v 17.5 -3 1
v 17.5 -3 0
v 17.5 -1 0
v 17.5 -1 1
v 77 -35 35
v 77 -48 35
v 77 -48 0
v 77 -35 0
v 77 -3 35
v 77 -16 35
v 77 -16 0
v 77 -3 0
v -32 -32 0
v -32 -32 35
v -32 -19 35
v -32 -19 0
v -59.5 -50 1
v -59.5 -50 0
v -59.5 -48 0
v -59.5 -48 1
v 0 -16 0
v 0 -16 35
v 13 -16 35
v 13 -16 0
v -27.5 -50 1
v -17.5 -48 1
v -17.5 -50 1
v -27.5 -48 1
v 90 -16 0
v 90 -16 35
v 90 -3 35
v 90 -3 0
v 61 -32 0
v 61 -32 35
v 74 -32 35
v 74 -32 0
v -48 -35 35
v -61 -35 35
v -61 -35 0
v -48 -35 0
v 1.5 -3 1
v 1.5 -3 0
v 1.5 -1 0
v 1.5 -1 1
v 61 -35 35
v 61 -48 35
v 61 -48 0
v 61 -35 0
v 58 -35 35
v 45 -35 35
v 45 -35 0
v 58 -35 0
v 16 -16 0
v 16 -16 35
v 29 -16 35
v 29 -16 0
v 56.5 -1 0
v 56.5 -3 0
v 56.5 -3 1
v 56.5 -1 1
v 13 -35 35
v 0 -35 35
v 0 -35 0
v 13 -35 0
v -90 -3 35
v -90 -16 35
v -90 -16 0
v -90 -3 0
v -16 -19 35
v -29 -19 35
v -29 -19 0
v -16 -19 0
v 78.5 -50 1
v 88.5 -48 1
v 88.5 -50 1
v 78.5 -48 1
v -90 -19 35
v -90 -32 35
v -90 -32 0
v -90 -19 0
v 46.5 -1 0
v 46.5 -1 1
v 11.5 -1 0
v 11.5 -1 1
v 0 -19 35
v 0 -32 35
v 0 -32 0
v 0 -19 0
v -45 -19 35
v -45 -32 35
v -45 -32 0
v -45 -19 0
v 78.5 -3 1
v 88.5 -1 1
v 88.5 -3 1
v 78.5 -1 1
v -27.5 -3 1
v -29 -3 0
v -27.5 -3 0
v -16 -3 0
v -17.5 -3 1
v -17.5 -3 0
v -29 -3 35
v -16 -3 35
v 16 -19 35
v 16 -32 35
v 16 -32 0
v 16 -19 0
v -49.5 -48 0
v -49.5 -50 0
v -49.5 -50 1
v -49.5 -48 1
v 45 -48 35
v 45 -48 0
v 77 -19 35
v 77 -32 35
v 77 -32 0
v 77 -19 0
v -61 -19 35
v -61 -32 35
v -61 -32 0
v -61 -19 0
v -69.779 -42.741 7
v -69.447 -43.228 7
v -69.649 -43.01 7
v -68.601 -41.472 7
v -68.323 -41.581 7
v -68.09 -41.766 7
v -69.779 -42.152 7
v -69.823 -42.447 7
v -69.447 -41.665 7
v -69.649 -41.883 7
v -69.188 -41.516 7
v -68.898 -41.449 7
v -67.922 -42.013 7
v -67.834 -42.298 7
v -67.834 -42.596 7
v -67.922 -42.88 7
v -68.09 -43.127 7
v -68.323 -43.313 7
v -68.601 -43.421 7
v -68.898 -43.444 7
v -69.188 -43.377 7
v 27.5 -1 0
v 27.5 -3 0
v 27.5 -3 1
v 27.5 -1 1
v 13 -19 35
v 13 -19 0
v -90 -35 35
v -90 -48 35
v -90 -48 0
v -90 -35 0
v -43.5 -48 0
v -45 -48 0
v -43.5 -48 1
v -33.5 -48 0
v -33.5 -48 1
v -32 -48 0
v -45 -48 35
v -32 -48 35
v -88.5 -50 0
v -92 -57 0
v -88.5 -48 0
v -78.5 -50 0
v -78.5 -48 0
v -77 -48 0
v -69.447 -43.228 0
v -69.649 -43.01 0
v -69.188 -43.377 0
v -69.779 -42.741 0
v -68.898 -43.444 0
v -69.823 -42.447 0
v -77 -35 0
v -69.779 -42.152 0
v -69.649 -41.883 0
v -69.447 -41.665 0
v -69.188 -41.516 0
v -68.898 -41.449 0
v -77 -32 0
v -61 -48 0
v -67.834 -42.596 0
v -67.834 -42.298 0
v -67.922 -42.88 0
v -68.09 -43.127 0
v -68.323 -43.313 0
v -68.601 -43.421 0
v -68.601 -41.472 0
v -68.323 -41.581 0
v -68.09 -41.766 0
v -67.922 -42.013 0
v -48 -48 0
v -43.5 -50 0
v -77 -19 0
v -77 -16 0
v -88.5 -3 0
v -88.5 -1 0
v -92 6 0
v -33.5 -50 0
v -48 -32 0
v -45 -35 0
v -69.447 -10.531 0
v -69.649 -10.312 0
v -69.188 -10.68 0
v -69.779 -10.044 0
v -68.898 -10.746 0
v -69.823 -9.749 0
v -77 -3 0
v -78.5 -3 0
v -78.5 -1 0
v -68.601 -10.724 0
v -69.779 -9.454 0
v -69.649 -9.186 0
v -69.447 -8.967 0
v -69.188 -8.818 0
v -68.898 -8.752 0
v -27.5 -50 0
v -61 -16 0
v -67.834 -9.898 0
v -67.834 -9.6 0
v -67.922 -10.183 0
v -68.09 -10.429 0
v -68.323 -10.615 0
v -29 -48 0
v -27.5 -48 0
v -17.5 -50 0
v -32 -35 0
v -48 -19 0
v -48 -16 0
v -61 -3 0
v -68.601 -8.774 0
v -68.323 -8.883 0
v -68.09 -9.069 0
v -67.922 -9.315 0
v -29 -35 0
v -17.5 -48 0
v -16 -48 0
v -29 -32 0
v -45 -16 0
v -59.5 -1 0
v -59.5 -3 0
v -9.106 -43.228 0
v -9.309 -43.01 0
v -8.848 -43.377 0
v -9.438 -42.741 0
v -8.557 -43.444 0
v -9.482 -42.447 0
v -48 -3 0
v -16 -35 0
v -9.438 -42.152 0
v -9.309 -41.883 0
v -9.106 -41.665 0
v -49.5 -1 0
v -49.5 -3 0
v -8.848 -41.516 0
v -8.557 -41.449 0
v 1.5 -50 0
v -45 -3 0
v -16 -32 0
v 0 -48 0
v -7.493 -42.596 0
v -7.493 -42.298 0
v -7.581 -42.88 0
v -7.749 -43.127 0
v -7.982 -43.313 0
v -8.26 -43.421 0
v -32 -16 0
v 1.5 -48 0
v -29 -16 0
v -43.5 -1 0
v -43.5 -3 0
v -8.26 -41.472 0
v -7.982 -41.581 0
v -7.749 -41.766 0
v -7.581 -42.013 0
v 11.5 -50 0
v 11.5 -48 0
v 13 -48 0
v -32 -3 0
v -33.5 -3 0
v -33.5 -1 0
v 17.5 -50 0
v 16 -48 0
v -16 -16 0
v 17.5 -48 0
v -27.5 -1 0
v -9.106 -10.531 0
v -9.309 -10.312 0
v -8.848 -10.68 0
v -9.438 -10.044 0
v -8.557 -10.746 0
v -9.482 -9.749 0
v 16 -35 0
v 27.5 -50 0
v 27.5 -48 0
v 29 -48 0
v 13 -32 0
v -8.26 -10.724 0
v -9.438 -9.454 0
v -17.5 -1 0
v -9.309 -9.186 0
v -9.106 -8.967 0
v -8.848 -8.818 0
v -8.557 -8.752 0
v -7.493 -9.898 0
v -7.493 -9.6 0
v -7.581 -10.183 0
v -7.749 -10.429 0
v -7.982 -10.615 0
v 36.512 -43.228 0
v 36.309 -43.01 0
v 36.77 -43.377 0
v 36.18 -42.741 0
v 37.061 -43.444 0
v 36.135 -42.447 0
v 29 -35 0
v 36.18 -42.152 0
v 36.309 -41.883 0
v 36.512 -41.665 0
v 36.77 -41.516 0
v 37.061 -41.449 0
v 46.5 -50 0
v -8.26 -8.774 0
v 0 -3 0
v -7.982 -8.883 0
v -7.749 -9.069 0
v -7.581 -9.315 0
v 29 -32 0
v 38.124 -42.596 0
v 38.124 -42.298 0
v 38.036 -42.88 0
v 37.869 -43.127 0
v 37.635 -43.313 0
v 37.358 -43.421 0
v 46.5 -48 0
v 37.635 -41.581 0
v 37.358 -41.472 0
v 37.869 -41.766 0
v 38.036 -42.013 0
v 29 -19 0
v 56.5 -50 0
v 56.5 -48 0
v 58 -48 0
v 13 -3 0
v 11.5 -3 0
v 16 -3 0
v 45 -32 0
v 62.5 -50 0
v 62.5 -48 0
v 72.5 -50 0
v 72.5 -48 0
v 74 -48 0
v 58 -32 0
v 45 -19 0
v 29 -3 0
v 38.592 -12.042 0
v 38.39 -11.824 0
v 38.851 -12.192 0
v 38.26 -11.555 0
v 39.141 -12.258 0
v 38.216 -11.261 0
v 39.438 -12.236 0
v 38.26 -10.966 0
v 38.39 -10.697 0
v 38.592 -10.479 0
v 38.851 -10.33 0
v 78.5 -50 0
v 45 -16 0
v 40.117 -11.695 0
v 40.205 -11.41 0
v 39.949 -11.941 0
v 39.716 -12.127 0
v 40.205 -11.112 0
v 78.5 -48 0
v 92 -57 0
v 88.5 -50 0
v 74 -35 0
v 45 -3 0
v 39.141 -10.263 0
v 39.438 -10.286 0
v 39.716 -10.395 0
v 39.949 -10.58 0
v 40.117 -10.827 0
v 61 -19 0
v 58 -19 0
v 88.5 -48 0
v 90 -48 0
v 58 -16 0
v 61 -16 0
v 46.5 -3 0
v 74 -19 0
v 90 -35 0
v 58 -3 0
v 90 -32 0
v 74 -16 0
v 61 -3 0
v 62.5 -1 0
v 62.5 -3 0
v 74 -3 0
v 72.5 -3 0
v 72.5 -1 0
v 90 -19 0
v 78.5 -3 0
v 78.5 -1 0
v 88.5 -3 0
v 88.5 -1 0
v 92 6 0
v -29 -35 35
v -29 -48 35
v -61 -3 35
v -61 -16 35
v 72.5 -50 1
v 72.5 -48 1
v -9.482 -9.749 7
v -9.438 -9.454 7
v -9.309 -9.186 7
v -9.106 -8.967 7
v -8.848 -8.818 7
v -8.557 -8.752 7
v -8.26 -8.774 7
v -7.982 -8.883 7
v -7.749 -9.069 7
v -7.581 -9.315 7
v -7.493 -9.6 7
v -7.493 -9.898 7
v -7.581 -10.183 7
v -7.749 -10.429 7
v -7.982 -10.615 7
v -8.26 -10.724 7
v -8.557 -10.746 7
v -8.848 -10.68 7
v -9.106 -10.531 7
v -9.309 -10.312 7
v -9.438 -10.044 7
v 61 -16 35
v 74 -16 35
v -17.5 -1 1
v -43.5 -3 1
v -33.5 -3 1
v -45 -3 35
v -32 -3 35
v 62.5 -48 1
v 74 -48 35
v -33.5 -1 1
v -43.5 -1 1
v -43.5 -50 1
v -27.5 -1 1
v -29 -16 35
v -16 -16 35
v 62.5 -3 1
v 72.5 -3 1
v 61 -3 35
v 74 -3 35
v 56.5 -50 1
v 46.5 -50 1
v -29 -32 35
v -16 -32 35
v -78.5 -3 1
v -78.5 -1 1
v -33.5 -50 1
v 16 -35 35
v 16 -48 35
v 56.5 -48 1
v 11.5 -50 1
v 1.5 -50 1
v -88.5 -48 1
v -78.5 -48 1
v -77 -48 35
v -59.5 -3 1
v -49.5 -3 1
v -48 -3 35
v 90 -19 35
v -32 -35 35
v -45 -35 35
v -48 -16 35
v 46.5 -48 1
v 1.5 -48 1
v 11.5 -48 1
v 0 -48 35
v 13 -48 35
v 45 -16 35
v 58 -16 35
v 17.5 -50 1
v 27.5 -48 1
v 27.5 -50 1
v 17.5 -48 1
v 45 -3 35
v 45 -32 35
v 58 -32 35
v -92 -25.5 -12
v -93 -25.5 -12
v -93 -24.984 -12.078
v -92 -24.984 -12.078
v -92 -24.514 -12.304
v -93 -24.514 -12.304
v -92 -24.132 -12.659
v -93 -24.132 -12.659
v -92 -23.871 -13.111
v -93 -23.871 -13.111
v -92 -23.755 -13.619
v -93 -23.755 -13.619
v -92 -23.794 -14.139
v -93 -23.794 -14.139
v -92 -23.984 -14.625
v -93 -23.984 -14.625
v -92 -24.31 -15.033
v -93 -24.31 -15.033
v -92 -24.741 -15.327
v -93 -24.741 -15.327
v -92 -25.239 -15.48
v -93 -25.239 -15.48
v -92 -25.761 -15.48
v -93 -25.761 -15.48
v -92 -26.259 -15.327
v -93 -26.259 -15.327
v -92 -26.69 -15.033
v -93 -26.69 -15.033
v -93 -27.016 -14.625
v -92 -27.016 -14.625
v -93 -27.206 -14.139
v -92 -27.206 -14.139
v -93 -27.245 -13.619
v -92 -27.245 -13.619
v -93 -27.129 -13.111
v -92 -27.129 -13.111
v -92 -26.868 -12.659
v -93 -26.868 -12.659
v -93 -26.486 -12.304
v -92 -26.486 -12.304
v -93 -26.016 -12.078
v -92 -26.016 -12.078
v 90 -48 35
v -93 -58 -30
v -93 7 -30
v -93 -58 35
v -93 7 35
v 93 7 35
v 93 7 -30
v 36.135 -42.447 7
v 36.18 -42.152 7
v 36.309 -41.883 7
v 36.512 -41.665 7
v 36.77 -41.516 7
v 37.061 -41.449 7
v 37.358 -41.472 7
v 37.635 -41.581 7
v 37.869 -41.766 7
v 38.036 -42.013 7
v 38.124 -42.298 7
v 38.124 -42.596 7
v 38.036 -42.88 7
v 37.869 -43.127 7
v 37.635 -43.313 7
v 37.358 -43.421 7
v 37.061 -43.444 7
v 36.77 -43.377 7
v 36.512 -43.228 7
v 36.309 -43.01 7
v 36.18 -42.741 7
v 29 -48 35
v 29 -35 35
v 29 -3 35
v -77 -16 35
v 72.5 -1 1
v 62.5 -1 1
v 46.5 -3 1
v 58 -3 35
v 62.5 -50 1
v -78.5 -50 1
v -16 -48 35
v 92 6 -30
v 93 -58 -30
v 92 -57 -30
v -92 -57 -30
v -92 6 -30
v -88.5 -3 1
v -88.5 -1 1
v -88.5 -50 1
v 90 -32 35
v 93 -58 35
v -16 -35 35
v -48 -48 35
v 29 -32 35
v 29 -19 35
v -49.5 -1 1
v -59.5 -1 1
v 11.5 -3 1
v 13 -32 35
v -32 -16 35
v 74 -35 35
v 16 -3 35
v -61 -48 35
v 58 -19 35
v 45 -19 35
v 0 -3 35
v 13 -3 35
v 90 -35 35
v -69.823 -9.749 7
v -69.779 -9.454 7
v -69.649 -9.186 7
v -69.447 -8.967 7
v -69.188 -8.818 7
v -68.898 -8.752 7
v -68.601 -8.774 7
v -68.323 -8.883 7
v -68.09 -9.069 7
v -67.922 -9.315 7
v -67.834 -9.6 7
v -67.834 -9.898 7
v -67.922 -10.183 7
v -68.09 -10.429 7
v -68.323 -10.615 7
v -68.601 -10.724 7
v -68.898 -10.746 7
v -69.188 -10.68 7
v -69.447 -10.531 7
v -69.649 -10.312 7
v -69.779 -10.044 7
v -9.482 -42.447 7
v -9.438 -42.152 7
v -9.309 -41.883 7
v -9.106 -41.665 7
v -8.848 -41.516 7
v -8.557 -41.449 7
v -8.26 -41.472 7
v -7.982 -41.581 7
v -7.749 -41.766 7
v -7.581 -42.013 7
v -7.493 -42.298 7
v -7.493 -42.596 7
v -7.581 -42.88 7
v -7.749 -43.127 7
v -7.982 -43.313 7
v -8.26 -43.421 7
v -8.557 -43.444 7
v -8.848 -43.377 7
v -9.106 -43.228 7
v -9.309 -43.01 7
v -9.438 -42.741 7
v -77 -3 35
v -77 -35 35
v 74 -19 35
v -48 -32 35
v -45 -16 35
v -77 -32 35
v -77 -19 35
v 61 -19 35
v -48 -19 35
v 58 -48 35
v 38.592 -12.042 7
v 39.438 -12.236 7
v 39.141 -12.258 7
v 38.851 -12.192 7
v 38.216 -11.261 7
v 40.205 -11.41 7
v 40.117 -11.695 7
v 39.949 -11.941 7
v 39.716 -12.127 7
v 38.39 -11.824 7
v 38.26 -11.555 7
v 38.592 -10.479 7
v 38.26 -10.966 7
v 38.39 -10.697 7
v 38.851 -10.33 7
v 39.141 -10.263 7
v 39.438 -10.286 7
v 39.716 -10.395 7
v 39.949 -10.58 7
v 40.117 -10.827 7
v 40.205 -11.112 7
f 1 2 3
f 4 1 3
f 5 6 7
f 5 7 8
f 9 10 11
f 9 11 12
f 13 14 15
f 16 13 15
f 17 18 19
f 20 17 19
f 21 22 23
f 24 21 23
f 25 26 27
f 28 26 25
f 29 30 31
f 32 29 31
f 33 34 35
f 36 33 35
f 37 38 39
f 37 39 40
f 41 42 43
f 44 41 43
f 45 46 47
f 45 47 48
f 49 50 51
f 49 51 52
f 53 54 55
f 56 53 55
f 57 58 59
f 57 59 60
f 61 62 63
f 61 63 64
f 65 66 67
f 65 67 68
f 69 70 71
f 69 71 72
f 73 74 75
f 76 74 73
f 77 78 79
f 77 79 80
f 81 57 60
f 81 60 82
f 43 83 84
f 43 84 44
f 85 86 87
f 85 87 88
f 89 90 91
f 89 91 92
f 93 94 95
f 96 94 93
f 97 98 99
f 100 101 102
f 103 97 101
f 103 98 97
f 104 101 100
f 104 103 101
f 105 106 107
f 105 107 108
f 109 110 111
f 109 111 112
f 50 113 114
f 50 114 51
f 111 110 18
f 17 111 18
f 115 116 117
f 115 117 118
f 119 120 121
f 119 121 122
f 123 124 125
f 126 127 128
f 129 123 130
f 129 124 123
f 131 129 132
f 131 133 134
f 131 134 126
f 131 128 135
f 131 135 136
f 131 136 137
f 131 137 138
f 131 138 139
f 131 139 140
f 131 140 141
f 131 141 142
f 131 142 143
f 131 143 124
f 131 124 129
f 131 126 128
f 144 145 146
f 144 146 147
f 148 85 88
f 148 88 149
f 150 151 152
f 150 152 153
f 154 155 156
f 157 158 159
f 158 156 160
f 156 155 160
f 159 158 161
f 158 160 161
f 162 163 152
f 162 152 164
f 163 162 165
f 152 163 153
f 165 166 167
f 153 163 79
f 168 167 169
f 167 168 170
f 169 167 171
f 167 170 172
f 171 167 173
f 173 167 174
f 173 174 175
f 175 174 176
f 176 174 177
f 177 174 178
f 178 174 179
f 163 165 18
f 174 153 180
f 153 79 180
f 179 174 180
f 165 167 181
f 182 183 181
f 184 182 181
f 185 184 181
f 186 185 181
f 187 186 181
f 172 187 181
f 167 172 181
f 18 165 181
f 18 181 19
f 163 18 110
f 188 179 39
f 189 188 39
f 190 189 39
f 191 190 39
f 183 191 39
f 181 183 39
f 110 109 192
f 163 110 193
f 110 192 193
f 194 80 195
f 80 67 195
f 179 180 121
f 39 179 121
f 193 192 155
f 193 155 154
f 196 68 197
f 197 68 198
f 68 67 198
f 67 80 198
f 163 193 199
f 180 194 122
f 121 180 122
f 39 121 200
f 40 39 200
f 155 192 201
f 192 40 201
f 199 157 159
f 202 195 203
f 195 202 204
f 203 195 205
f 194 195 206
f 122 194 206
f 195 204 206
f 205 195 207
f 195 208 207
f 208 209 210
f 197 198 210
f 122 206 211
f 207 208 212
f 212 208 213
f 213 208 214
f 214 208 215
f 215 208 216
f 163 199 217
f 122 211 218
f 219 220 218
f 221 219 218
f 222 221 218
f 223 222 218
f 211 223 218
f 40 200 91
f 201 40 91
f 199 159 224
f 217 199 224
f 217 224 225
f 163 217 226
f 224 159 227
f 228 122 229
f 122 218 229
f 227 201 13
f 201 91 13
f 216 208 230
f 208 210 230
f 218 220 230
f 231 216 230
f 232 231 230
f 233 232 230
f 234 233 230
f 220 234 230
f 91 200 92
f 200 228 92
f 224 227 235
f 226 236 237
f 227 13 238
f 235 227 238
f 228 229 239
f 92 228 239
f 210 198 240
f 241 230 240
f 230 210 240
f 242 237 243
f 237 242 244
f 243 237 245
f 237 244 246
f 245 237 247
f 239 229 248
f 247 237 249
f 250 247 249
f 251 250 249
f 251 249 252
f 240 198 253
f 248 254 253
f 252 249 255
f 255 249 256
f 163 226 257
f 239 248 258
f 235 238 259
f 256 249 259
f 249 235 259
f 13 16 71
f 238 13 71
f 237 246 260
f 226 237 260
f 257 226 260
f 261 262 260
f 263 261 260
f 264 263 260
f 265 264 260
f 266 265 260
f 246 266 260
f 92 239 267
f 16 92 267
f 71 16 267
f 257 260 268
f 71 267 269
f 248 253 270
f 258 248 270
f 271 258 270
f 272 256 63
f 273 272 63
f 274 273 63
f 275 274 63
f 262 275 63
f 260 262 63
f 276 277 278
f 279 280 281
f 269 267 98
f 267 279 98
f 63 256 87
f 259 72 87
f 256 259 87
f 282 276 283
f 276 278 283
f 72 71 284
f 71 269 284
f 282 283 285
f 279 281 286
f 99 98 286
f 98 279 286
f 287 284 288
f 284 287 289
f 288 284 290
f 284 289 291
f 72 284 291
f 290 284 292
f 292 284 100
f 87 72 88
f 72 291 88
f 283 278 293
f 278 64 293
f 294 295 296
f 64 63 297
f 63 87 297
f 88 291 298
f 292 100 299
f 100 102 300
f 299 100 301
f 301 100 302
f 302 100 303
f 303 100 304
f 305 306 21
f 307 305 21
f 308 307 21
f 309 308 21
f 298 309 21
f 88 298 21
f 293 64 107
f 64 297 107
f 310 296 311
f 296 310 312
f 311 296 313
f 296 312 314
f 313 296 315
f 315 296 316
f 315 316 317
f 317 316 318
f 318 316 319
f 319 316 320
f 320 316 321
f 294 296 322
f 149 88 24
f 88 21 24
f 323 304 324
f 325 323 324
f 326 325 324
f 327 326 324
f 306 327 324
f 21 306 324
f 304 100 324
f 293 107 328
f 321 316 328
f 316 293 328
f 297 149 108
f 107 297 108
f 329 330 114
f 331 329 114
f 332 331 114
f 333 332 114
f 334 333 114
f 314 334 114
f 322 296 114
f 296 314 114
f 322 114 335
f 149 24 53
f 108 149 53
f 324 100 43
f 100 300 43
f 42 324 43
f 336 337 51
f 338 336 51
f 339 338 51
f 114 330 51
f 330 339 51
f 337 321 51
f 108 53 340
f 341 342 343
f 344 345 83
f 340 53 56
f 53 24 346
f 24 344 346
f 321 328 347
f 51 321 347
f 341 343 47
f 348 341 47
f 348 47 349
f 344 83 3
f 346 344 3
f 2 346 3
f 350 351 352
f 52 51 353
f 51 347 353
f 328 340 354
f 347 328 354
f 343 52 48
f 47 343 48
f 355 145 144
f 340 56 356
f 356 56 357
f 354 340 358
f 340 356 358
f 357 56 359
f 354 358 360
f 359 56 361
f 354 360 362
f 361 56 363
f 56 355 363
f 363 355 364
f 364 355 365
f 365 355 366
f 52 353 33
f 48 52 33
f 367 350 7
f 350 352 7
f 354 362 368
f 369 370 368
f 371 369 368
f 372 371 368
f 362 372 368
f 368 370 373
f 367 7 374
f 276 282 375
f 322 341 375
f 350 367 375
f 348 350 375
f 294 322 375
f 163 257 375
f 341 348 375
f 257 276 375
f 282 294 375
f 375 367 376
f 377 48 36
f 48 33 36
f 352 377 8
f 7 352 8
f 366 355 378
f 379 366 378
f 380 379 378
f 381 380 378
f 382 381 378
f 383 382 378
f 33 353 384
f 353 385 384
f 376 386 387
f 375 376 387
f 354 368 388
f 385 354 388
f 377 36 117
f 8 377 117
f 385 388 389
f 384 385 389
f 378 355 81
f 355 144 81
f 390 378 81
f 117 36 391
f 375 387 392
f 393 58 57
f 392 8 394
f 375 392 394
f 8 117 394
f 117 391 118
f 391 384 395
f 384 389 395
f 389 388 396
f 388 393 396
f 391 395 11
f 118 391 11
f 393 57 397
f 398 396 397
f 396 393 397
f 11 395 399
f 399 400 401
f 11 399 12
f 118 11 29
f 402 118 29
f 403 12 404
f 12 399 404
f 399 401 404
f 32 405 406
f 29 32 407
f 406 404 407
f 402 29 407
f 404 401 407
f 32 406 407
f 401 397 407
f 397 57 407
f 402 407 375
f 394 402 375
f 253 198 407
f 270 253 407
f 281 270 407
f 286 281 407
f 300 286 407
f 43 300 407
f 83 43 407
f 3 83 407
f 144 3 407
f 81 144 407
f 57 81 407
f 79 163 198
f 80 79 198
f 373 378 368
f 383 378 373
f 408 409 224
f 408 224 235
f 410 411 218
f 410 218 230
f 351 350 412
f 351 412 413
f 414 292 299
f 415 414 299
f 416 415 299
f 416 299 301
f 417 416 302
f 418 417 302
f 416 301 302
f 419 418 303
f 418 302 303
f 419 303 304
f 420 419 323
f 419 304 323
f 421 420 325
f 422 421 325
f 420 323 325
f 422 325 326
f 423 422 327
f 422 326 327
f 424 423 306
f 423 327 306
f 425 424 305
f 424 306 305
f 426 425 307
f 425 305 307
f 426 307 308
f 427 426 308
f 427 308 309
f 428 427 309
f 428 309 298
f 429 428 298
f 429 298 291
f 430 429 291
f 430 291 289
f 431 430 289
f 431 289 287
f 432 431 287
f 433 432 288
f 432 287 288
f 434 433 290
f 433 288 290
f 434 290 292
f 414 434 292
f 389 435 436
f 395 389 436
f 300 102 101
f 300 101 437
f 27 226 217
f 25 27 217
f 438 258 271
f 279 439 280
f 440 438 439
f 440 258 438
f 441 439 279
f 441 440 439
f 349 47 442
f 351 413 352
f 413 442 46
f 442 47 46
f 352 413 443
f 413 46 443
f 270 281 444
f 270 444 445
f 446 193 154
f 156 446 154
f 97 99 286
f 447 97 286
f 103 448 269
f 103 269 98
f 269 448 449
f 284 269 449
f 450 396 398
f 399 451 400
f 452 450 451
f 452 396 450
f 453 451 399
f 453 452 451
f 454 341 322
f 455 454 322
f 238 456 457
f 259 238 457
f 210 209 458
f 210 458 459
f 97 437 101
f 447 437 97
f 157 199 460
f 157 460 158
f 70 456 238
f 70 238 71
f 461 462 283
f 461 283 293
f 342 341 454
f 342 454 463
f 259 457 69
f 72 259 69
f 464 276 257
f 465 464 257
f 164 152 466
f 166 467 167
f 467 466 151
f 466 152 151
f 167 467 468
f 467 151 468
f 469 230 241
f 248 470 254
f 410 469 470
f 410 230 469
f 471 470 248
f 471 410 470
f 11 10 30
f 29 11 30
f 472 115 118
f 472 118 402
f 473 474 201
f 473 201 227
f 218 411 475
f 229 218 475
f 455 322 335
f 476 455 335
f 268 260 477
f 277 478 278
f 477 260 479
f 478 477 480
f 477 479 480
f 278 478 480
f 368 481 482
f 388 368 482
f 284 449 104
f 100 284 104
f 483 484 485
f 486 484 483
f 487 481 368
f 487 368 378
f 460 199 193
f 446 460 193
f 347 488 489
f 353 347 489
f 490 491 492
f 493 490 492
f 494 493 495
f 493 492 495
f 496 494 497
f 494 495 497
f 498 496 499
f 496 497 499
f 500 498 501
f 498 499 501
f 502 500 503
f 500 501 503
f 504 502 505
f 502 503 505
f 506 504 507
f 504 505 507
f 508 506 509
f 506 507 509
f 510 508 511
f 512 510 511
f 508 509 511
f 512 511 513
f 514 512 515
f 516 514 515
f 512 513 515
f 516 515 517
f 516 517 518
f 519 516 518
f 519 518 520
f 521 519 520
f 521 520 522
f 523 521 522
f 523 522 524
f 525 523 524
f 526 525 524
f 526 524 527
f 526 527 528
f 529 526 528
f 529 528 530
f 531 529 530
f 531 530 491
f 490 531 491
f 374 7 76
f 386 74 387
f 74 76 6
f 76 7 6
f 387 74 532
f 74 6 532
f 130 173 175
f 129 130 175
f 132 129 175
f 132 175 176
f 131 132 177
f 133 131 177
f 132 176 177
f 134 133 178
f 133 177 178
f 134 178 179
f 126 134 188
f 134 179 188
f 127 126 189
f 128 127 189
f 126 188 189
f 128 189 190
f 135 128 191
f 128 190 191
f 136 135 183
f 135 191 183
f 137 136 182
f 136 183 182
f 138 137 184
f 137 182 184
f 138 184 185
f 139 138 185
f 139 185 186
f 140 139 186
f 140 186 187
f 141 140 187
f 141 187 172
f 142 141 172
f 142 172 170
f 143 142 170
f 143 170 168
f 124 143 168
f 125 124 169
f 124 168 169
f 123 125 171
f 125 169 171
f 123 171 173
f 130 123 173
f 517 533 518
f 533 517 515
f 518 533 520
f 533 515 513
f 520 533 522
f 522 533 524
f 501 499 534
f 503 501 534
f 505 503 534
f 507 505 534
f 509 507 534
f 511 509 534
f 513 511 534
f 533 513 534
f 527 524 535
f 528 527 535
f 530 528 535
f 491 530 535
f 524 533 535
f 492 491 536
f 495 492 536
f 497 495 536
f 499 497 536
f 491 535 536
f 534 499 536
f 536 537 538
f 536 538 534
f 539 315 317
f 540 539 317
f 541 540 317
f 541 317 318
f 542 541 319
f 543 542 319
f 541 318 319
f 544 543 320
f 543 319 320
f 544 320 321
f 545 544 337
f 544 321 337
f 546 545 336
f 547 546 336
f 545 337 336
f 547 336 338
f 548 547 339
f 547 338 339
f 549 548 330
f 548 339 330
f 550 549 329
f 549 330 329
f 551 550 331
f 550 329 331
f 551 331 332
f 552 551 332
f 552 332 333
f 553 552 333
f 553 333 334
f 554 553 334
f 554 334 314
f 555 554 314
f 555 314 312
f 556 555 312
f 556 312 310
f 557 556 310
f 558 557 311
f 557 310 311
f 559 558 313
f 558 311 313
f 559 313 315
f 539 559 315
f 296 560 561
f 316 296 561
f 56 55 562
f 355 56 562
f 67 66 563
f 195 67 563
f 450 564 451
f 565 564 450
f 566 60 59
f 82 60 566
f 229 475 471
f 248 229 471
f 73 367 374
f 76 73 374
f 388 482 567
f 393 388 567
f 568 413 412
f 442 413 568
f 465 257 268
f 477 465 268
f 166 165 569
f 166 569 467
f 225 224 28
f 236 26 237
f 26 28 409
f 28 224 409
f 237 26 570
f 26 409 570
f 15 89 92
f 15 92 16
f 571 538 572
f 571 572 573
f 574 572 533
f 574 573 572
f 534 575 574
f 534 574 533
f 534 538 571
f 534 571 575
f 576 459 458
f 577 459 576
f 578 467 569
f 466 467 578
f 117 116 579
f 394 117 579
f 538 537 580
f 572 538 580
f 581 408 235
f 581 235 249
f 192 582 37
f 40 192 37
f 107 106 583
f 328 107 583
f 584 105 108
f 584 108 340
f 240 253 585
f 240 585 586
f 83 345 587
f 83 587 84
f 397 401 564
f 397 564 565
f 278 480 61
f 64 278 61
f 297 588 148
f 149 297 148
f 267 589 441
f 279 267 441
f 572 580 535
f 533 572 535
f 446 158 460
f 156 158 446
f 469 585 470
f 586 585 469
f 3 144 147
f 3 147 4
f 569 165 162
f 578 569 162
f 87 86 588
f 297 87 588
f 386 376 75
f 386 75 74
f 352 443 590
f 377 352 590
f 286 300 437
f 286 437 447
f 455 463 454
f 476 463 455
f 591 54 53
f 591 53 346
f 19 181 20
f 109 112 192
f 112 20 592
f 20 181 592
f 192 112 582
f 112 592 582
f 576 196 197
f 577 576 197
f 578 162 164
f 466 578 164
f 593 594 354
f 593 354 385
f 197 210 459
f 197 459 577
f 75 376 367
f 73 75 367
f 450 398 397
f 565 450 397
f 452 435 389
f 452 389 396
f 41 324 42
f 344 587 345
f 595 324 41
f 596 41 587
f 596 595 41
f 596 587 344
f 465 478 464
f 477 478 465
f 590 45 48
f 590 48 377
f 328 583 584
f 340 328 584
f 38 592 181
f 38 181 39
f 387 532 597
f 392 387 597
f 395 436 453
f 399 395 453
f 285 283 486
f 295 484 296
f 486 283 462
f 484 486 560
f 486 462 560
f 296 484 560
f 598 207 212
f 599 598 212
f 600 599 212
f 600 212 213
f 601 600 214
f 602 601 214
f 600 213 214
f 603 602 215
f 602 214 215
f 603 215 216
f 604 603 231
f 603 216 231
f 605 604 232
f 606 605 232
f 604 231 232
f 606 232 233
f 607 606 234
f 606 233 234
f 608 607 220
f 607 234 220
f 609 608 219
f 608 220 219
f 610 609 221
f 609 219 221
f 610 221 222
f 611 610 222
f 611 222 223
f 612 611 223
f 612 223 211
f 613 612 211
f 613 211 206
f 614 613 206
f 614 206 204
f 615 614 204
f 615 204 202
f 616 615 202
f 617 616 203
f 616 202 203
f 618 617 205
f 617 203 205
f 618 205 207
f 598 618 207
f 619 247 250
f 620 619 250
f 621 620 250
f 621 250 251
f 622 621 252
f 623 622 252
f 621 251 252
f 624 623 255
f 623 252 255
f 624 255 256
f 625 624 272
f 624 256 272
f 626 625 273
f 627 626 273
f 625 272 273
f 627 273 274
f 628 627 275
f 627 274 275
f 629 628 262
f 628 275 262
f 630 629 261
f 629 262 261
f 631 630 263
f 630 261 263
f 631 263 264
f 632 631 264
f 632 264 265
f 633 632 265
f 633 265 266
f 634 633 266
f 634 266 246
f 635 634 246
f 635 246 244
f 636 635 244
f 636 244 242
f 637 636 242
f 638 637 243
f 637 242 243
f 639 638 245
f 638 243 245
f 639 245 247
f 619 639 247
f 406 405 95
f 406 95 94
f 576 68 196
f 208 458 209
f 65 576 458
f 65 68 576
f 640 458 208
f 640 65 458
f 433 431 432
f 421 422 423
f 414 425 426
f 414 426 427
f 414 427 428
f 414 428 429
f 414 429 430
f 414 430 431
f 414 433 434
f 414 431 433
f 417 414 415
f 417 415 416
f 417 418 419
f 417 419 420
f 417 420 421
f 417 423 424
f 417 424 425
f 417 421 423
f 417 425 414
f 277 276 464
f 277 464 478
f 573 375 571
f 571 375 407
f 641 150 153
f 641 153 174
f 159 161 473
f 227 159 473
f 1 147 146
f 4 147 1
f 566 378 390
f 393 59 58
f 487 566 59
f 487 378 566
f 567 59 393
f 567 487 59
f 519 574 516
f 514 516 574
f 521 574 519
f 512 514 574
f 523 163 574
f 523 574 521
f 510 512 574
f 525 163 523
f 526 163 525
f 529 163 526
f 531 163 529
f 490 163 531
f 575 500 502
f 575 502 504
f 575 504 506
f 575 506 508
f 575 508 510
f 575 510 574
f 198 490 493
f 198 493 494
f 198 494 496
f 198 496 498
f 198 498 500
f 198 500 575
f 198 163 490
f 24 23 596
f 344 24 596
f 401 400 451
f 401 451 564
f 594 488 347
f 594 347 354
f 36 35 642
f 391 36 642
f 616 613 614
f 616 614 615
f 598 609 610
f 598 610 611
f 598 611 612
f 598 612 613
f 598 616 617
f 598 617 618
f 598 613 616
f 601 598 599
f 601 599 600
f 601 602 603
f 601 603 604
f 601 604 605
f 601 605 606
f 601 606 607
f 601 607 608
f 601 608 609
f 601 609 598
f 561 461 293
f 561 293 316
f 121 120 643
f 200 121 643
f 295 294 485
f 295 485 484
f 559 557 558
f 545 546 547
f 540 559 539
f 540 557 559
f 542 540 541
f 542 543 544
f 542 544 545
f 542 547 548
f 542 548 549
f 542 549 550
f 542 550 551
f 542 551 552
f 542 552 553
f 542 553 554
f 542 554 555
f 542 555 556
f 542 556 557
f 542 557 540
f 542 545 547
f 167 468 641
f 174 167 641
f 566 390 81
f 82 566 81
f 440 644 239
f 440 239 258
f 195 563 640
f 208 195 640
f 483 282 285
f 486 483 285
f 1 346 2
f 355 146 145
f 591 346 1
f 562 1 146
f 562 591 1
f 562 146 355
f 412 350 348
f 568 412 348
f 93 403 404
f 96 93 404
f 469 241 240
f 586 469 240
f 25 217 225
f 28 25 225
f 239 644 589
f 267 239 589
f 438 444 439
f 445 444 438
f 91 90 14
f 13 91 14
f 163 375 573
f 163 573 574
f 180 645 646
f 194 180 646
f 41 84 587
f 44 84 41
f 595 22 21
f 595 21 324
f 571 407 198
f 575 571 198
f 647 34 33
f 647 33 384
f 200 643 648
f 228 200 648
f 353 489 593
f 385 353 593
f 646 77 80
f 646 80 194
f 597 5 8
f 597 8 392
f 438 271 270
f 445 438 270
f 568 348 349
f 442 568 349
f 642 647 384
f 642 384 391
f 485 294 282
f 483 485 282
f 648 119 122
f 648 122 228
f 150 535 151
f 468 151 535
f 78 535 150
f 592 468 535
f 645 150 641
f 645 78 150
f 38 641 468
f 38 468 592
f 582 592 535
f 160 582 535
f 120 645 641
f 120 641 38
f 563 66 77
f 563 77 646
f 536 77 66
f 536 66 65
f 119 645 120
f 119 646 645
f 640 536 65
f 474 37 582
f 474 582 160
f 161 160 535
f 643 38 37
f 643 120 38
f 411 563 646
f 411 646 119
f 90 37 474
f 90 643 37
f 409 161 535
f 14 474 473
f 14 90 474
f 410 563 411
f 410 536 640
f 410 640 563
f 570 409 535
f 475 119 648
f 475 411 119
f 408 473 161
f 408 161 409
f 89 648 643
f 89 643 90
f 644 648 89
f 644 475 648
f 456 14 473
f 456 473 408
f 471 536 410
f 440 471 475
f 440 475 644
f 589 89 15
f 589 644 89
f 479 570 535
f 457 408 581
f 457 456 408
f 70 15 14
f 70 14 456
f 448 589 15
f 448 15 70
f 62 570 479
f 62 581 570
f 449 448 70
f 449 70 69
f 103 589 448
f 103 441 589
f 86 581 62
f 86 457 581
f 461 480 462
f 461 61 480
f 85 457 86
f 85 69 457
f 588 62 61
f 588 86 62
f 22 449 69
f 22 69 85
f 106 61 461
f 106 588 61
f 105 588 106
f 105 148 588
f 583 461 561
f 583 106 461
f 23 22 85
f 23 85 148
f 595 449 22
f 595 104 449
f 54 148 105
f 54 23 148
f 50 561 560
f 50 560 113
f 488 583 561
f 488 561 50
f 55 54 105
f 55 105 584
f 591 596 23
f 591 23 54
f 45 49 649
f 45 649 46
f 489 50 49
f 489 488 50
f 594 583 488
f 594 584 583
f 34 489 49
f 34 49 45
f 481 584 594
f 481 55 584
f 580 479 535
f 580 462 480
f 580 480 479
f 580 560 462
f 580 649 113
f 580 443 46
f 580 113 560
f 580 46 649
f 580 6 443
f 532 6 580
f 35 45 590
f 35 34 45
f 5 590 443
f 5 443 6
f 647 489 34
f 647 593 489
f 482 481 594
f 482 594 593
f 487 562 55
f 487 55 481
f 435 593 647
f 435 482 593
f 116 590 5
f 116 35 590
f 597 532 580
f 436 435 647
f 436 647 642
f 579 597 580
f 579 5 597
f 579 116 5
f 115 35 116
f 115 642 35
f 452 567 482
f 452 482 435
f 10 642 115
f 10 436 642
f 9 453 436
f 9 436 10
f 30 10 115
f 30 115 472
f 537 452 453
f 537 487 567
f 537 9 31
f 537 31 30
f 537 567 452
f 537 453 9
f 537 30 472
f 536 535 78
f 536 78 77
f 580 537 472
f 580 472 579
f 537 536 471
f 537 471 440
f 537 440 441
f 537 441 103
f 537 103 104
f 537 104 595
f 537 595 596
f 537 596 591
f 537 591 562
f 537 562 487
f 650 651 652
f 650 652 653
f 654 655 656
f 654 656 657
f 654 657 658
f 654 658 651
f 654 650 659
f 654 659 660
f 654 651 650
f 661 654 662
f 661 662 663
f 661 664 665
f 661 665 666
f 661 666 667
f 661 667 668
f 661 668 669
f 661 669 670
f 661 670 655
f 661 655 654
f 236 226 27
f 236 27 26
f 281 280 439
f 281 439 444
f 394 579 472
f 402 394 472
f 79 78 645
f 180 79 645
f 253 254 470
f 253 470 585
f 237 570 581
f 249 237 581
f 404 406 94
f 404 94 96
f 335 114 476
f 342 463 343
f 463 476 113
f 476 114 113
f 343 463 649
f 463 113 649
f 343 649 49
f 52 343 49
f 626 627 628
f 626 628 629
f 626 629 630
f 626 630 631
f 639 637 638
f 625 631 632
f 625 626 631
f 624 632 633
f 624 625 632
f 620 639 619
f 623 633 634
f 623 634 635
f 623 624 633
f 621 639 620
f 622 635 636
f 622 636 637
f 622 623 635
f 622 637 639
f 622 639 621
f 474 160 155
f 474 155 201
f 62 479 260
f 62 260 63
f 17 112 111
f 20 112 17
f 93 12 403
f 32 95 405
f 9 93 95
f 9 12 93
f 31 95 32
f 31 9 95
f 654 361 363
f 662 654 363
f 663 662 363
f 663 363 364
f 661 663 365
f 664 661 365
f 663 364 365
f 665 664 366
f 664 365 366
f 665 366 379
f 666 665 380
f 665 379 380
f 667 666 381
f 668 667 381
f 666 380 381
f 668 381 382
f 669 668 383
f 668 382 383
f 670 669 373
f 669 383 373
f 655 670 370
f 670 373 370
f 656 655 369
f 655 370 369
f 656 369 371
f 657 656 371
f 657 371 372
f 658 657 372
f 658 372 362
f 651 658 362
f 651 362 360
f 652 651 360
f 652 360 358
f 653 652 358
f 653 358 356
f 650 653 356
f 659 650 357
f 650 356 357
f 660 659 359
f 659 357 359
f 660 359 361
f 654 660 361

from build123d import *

# Parameters (mm, degrees)
ESQUISSE1_W                     = 186
ESQUISSE1_H                     = 51
BOSS_EXTRU_1_DEPTH              = 35
ESQUISSE7_W                     = 13
ESQUISSE7_H                     = 13
ENL_V_MAT_EXTRU_5_DEPTH         = 91
R_P_TITION_LIN_AIRE5_COUNT      = 3
R_P_TITION_LIN_AIRE5_PITCH      = 16
ESQUISSE8_W                     = 13
ESQUISSE8_H                     = 13
ENL_V_MAT_EXTRU_6_DEPTH         = 103
R_P_TITION_LIN_AIRE6_COUNT      = 3
R_P_TITION_LIN_AIRE6_PITCH      = 16
R_P_TITION_LIN_AIRE6_COUNT_DIR2 = 3
R_P_TITION_LIN_AIRE6_PITCH_DIR2 = 16
ESQUISSE9_W                     = 13
ESQUISSE9_H                     = 13
ENL_V_MAT_EXTRU_7_DEPTH         = 77
R_P_TITION_LIN_AIRE7_COUNT      = 3
R_P_TITION_LIN_AIRE7_PITCH      = 16
R_P_TITION_LIN_AIRE7_COUNT_DIR2 = 2
R_P_TITION_LIN_AIRE7_PITCH_DIR2 = 16
ESQUISSE10_W                    = 13
ESQUISSE10_H                    = 13
ENL_V_MAT_EXTRU_8_DEPTH         = 78
R_P_TITION_LIN_AIRE8_COUNT      = 3
R_P_TITION_LIN_AIRE8_PITCH      = 16
R_P_TITION_LIN_AIRE8_COUNT_DIR2 = 3
R_P_TITION_LIN_AIRE8_PITCH_DIR2 = 16
ESQUISSE14_W                    = 10
ESQUISSE14_H                    = 5
BOSS_EXTRU_3_DEPTH              = 7
ESQUISSE25_W                    = 186
ESQUISSE25_H                    = 35
BOSS_EXTRU_7_DEPTH              = 7
ESQUISSE18_W                    = 186
ESQUISSE18_H                    = 35
BOSS_EXTRU_5_DEPTH              = 7
ESQUISSE15_R                    = 1
ENL_V_MAT_EXTRU_10_DEPTH        = 7
ESQUISSE24_W                    = 10
ESQUISSE24_H                    = 2
ENL_V_MAT_EXTRU_12_DEPTH        = 1
ESQUISSE19_W                    = 186
ESQUISSE19_H                    = 1
ESQUISSE19_W_2                  = 1
ESQUISSE19_H_2                  = 63
BOSS_EXTRU_8_DEPTH              = 30
ESQUISSE26_R                    = 1.75
ENL_V_MAT_EXTRU_14_DEPTH        = 30


with BuildPart() as part:
    # Esquisse1 → Boss.-Extru.1 (new body)
    with BuildSketch(Plane.XY):
        with Locations((0, -25.5)):
            Rectangle(ESQUISSE1_W, ESQUISSE1_H)
    extrude(amount=BOSS_EXTRU_1_DEPTH)

    # Esquisse7 → Enlèv. mat.-Extru.5 (cut)
    with BuildSketch(Plane.XY.offset(35)):
        with Locations((-83.5, -9.5)):
            Rectangle(ESQUISSE7_W, ESQUISSE7_H)
    enl_v_mat_extru_5 = extrude(amount=-ENL_V_MAT_EXTRU_5_DEPTH, mode=Mode.SUBTRACT)

    # Répétition linéaire5: Enlèv. mat.-Extru.5 ×3
    with Locations(*[(0, -i * R_P_TITION_LIN_AIRE5_PITCH, 0) for i in range(1, R_P_TITION_LIN_AIRE5_COUNT)]):
        add(enl_v_mat_extru_5, mode=Mode.SUBTRACT)

    # Esquisse8 → Enlèv. mat.-Extru.6 (cut)
    with BuildSketch(Plane.XY.offset(35)):
        with Locations((-54.5, -9.5)):
            Rectangle(ESQUISSE8_W, ESQUISSE8_H)
    enl_v_mat_extru_6 = extrude(amount=-ENL_V_MAT_EXTRU_6_DEPTH, mode=Mode.SUBTRACT)

    # Répétition linéaire6: Enl_v. mat.-Extru.6 3 × 3
    with Locations(*[(j * R_P_TITION_LIN_AIRE6_PITCH_DIR2, -i * R_P_TITION_LIN_AIRE6_PITCH, 0) for i in range(R_P_TITION_LIN_AIRE6_COUNT) for j in range(R_P_TITION_LIN_AIRE6_COUNT_DIR2) if (i, j) != (0, 0)]):
        add(enl_v_mat_extru_6, mode=Mode.SUBTRACT)

    # Esquisse9 → Enlèv. mat.-Extru.7 (cut)
    with BuildSketch(Plane.XY.offset(35)):
        with Locations((6.5, -9.5)):
            Rectangle(ESQUISSE9_W, ESQUISSE9_H)
    enl_v_mat_extru_7 = extrude(amount=-ENL_V_MAT_EXTRU_7_DEPTH, mode=Mode.SUBTRACT)

    # Répétition linéaire7: Enl_v. mat.-Extru.7 3 × 2
    with Locations(*[(j * R_P_TITION_LIN_AIRE7_PITCH_DIR2, -i * R_P_TITION_LIN_AIRE7_PITCH, 0) for i in range(R_P_TITION_LIN_AIRE7_COUNT) for j in range(R_P_TITION_LIN_AIRE7_COUNT_DIR2) if (i, j) != (0, 0)]):
        add(enl_v_mat_extru_7, mode=Mode.SUBTRACT)

    # Esquisse10 → Enlèv. mat.-Extru.8 (cut)
    with BuildSketch(Plane.XY.offset(35)):
        with Locations((51.5, -9.5)):
            Rectangle(ESQUISSE10_W, ESQUISSE10_H)
    enl_v_mat_extru_8 = extrude(amount=-ENL_V_MAT_EXTRU_8_DEPTH, mode=Mode.SUBTRACT)

    # Répétition linéaire8: Enl_v. mat.-Extru.8 3 × 3
    with Locations(*[(i * R_P_TITION_LIN_AIRE8_PITCH, -j * R_P_TITION_LIN_AIRE8_PITCH_DIR2, 0) for i in range(R_P_TITION_LIN_AIRE8_COUNT) for j in range(R_P_TITION_LIN_AIRE8_COUNT_DIR2) if (i, j) != (0, 0)]):
        add(enl_v_mat_extru_8, mode=Mode.SUBTRACT)

    # Esquisse14 → Boss.-Extru.3 (add)
    with BuildSketch(Plane.XZ.offset(51)):
        with Locations((-7.663083533, 2.5)):
            Rectangle(ESQUISSE14_W, ESQUISSE14_H)
    extrude(amount=BOSS_EXTRU_3_DEPTH)

    # Esquisse25 → Boss.-Extru.7 (add)
    with BuildSketch(Plane(origin=(0, 0, 0), x_dir=(1, 0, 0), z_dir=(0, 1, 0))):
        with Locations((0, -17.5)):
            Rectangle(ESQUISSE25_W, ESQUISSE25_H)
    extrude(amount=BOSS_EXTRU_7_DEPTH)

    # Esquisse18 → Boss.-Extru.5 (add)
    with BuildSketch(Plane.XZ.offset(51)):
        with Locations((0, 17.5)):
            Rectangle(ESQUISSE18_W, ESQUISSE18_H)
    extrude(amount=BOSS_EXTRU_5_DEPTH)

    # Esquisse15 → Enlèv. mat.-Extru.10 (cut)
    with BuildSketch(Plane(origin=(0, 0, 0), x_dir=(-1, 0, 0), z_dir=(0, 0, -1))):
        with Locations((8.482305804, -42.446555864)):
            Circle(ESQUISSE15_R)
        with Locations((8.482305804, -9.749028666)):
            Circle(ESQUISSE15_R)
        with Locations((68.823038652, -42.446555864)):
            Circle(ESQUISSE15_R)
        with Locations((68.823038652, -9.749028666)):
            Circle(ESQUISSE15_R)
        with Locations((-37.13548256, -42.446555864)):
            Circle(ESQUISSE15_R)
        with Locations((-39.215855023, -11.260648292)):
            Circle(ESQUISSE15_R)
    extrude(amount=-ENL_V_MAT_EXTRU_10_DEPTH, mode=Mode.SUBTRACT)

    # Esquisse24 → Enlèv. mat.-Extru.12 (cut)
    with BuildSketch(Plane(origin=(0, 0, 0), x_dir=(-1, 0, 0), z_dir=(0, 0, -1))):
        with Locations((83.5, -49)):
            Rectangle(ESQUISSE24_W, ESQUISSE24_H)
        with Locations((54.5, -49)):
            Rectangle(ESQUISSE24_W, ESQUISSE24_H)
        with Locations((38.5, -49)):
            Rectangle(ESQUISSE24_W, ESQUISSE24_H)
        with Locations((22.5, -49)):
            Rectangle(ESQUISSE24_W, ESQUISSE24_H)
        with Locations((-6.5, -49)):
            Rectangle(ESQUISSE24_W, ESQUISSE24_H)
        with Locations((-22.5, -49)):
            Rectangle(ESQUISSE24_W, ESQUISSE24_H)
        with Locations((-51.5, -49)):
            Rectangle(ESQUISSE24_W, ESQUISSE24_H)
        with Locations((-67.5, -49)):
            Rectangle(ESQUISSE24_W, ESQUISSE24_H)
        with Locations((-83.5, -49)):
            Rectangle(ESQUISSE24_W, ESQUISSE24_H)
        with Locations((-83.5, -2)):
            Rectangle(ESQUISSE24_W, ESQUISSE24_H)
        with Locations((-67.5, -2)):
            Rectangle(ESQUISSE24_W, ESQUISSE24_H)
        with Locations((-51.5, -2)):
            Rectangle(ESQUISSE24_W, ESQUISSE24_H)
        with Locations((-22.5, -2)):
            Rectangle(ESQUISSE24_W, ESQUISSE24_H)
        with Locations((-6.5, -2)):
            Rectangle(ESQUISSE24_W, ESQUISSE24_H)
        with Locations((22.5, -2)):
            Rectangle(ESQUISSE24_W, ESQUISSE24_H)
        with Locations((38.5, -2)):
            Rectangle(ESQUISSE24_W, ESQUISSE24_H)
        with Locations((54.5, -2)):
            Rectangle(ESQUISSE24_W, ESQUISSE24_H)
        with Locations((83.5, -2)):
            Rectangle(ESQUISSE24_W, ESQUISSE24_H)
    extrude(amount=-ENL_V_MAT_EXTRU_12_DEPTH, mode=Mode.SUBTRACT)

    # Esquisse19 → Boss.-Extru.8 (add)
    with BuildSketch(Plane(origin=(0, 0, 0), x_dir=(-1, 0, 0), z_dir=(0, 0, -1))):
        with Locations((0, -57.5)):
            Rectangle(ESQUISSE19_W, ESQUISSE19_H)
        with Locations((92.5, -25.5)):
            Rectangle(ESQUISSE19_W_2, ESQUISSE19_H_2)
        with Locations((0, 6.5)):
            Rectangle(ESQUISSE19_W, ESQUISSE19_H)
        with Locations((-92.5, -25.5)):
            Rectangle(ESQUISSE19_W_2, ESQUISSE19_H_2)
    extrude(amount=BOSS_EXTRU_8_DEPTH)

    # Esquisse26 → Enlèv. mat.-Extru.14 (cut)
    with BuildSketch(Plane.ZY.offset(93)):
        with Locations((-13.75, -25.5)):
            Circle(ESQUISSE26_R)
    extrude(amount=-ENL_V_MAT_EXTRU_14_DEPTH, mode=Mode.SUBTRACT)


solid = part.part
